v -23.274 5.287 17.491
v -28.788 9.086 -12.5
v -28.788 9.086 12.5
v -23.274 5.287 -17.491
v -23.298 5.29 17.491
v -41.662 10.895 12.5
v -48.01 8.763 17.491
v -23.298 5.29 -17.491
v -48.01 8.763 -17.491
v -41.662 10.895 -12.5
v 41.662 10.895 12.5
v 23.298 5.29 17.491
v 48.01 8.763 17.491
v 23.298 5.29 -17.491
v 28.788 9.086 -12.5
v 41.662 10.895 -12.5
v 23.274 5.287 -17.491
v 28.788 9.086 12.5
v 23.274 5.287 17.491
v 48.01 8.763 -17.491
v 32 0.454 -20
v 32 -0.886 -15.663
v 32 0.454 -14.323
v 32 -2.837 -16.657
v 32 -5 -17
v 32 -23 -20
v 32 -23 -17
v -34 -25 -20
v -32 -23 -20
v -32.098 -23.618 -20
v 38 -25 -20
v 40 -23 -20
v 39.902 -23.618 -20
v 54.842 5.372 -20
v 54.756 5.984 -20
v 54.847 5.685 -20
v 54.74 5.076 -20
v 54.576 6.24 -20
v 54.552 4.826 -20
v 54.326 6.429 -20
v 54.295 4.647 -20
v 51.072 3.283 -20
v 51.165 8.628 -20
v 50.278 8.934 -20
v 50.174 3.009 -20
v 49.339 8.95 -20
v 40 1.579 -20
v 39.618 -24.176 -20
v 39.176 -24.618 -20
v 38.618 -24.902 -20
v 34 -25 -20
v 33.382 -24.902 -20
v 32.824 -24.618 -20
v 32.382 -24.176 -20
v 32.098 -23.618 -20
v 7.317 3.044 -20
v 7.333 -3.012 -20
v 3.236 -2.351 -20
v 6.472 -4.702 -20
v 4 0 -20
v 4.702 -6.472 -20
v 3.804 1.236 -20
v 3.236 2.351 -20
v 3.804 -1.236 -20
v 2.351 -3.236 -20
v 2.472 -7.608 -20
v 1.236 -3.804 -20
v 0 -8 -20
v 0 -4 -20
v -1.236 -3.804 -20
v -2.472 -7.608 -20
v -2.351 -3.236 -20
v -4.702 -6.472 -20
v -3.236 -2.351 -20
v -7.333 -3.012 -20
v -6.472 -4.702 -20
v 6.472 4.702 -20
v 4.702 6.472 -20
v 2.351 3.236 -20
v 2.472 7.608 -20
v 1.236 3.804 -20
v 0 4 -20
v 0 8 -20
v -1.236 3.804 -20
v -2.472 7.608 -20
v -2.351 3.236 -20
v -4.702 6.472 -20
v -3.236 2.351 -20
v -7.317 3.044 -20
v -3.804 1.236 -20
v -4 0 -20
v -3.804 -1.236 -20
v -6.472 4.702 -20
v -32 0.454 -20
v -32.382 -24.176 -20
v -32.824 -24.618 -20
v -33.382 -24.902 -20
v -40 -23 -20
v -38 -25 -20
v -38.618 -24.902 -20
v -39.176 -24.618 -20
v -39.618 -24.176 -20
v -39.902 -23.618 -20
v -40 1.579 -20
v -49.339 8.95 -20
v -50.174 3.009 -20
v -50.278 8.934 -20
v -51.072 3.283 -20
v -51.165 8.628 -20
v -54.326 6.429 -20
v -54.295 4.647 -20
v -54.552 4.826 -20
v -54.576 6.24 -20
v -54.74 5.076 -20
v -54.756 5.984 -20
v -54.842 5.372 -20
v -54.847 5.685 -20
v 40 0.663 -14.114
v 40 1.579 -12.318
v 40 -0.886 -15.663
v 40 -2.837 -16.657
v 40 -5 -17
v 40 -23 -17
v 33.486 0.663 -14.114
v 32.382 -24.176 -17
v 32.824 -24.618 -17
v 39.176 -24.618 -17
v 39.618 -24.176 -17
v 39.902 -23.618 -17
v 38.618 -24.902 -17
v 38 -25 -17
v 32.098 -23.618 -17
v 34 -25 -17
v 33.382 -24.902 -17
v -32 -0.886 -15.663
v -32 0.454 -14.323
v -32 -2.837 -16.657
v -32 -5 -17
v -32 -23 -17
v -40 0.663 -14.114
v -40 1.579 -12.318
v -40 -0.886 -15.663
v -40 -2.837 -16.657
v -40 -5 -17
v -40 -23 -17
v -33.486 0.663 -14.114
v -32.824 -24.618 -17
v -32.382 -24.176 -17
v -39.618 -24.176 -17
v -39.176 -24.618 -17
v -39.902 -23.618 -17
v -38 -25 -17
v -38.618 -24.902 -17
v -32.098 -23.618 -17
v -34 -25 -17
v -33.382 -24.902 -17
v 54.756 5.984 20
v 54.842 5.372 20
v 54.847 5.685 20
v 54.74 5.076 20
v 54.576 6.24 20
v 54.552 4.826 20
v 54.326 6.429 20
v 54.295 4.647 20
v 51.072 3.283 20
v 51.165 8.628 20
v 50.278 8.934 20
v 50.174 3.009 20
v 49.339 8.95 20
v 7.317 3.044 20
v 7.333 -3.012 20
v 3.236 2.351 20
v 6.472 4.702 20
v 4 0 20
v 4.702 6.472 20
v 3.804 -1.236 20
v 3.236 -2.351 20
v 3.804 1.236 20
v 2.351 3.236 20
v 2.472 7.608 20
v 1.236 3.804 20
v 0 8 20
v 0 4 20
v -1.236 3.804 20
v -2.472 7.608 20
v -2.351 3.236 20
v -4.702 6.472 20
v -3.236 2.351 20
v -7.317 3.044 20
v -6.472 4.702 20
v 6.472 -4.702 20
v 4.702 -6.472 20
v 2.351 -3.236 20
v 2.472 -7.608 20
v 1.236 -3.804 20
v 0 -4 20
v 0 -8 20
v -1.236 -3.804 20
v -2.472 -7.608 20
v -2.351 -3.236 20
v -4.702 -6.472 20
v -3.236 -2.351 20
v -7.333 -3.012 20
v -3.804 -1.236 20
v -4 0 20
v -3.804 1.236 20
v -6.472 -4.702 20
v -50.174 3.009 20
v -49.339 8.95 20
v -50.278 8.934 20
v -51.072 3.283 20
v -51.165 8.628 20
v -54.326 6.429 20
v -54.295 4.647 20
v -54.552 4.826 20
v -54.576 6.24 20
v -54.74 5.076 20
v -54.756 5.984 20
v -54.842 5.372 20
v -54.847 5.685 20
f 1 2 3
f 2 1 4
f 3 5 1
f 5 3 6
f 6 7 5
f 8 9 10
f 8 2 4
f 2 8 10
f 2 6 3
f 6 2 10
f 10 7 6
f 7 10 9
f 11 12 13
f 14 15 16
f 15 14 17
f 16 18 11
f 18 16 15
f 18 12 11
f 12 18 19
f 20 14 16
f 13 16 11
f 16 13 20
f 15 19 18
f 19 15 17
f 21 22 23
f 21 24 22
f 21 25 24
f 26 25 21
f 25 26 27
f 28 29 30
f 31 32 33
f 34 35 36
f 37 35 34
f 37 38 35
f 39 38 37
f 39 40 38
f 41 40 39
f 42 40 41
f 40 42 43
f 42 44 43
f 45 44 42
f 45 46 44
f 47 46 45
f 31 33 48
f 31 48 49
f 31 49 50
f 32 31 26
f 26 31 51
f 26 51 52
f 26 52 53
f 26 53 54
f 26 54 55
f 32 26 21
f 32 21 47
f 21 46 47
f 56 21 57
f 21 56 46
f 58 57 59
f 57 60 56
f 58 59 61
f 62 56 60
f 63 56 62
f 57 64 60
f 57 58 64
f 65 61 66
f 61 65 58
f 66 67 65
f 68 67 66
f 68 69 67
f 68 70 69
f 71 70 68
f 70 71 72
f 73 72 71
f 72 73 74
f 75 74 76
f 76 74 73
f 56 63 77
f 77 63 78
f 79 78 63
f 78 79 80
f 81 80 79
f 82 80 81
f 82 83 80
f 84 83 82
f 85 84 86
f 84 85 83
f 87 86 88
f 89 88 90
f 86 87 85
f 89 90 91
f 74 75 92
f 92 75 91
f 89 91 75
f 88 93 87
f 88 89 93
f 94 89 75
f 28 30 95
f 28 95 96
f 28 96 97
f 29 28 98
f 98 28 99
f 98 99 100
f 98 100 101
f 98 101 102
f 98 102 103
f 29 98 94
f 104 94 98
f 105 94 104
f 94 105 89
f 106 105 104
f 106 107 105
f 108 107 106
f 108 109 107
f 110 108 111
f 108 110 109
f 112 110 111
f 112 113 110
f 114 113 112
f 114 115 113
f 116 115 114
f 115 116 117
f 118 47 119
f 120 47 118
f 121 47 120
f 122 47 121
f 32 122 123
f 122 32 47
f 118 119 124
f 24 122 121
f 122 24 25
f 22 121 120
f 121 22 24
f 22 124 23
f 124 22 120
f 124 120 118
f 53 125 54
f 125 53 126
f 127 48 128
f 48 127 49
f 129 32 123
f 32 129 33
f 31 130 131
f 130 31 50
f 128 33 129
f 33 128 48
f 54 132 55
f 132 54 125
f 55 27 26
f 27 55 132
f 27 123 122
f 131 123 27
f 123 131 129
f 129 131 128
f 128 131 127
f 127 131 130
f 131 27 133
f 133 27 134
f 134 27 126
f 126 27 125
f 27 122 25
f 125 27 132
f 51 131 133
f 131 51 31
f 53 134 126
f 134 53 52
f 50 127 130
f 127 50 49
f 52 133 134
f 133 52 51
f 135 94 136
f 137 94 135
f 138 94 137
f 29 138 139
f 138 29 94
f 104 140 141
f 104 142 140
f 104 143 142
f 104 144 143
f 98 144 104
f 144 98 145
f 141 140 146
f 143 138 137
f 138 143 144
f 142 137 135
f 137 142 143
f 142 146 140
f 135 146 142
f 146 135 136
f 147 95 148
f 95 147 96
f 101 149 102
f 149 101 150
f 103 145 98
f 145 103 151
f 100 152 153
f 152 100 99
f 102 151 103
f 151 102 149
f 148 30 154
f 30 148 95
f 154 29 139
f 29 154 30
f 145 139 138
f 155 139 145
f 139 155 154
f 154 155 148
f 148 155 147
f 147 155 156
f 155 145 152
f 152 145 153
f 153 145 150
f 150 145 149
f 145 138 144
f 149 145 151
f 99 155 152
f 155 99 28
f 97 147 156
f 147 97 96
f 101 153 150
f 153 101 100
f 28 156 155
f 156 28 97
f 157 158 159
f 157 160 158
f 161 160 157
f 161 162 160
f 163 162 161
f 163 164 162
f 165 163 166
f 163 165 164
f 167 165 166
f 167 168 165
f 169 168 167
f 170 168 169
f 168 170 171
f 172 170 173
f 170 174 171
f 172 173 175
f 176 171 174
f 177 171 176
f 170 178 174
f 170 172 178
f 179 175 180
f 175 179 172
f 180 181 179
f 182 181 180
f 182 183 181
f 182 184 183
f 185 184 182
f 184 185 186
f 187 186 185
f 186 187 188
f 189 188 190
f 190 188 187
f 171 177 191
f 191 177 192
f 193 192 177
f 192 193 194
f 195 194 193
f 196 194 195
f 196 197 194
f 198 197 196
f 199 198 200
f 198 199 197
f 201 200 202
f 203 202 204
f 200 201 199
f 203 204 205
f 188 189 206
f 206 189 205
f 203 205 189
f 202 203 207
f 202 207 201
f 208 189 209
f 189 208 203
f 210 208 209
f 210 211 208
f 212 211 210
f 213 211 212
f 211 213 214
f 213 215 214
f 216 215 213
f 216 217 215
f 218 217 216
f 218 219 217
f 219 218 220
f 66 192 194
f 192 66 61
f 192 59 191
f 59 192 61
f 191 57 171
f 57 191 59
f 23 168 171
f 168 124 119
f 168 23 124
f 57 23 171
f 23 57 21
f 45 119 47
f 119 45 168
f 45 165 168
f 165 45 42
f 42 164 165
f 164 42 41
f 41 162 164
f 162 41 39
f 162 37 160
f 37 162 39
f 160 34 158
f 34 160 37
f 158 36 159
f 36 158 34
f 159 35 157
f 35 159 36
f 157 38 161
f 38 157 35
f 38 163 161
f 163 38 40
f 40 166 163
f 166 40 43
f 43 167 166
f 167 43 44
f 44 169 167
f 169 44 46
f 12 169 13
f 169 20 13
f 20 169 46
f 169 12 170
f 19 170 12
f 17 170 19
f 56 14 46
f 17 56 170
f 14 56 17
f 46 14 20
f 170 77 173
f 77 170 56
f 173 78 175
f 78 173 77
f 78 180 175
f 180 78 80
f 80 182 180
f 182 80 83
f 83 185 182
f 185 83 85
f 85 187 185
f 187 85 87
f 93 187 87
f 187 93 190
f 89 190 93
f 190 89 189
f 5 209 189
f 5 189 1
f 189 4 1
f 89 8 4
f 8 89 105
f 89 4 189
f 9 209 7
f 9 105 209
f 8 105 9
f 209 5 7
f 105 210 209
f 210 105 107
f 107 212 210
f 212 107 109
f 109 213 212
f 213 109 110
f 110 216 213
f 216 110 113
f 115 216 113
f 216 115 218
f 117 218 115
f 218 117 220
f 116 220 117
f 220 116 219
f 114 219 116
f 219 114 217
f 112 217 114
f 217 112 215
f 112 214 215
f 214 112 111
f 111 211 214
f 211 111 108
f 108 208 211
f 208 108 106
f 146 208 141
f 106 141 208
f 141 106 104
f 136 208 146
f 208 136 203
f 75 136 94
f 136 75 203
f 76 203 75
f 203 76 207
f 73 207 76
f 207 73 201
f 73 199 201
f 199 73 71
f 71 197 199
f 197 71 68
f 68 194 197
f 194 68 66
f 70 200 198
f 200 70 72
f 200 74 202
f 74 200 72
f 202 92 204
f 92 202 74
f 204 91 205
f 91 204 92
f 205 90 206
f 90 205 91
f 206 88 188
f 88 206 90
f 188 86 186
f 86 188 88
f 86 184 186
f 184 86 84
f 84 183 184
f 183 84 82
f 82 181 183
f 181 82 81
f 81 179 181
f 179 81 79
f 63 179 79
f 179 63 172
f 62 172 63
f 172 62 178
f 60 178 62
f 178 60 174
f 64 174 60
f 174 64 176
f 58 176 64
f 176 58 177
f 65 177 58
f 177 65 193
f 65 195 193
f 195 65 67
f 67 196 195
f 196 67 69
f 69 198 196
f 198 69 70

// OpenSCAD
$fn = 20;

module copy_mirror() {
    children()
        ;
    mirror([1, 0, 0])
    children()
        ;
}

module buttons() {
    // core
    linear_extrude(40, center=true)
    difference() {
        union() {
            circle(8)
                ;
            translate([0, 2.5])
            for (i = [-1, 1])
            translate([25 * i, 0])
            rotate(8 * i)
            union() {
                square([50, 6], center=true)
                    ;
                translate([25 * i, 0])
                hull() {
                    circle(3)
                        ;
                    translate([4 * i, -1])
                    circle(1)
                        ;
                }
            }
                ;
        }
            ;
        circle(4)
            ;
    }
        ;
    // button pads
    translate([0, 1.96, 0])
    for (i = [-1, 1])
    rotate([0, 0, 8 * i])
    translate([36 * i, 0, 0])
    hull() {
        cube([25, 0.1, 35], center=true)
            ;
        translate([0, 3, 0])
        cube([13, 0.1, 25], center=true)
            ;
    }
        ;
    // camera target bar
    copy_mirror()
    translate([40, 5, -20])
    rotate([0, 0, 180])
    union() {
        //rotate(8 * i)
        linear_extrude(3)
        minkowski() {
            square([8 - 2 * 2, 30 - 2 * 2])
               ;
            translate([1, 1] * 2)
            circle(2)
                ;
        }
        difference() {
            cube([8, 10, 10])
                ;
            translate([0, 10, 10])
            rotate([0, 90, 0])
            cylinder(r=7, h=99, center=true)
                ;
        }
    }
        ;
}

buttons()
    ;

/*translate([0, 0, 5])
cube([80, 30, 10], center=true)
    ;
*/
